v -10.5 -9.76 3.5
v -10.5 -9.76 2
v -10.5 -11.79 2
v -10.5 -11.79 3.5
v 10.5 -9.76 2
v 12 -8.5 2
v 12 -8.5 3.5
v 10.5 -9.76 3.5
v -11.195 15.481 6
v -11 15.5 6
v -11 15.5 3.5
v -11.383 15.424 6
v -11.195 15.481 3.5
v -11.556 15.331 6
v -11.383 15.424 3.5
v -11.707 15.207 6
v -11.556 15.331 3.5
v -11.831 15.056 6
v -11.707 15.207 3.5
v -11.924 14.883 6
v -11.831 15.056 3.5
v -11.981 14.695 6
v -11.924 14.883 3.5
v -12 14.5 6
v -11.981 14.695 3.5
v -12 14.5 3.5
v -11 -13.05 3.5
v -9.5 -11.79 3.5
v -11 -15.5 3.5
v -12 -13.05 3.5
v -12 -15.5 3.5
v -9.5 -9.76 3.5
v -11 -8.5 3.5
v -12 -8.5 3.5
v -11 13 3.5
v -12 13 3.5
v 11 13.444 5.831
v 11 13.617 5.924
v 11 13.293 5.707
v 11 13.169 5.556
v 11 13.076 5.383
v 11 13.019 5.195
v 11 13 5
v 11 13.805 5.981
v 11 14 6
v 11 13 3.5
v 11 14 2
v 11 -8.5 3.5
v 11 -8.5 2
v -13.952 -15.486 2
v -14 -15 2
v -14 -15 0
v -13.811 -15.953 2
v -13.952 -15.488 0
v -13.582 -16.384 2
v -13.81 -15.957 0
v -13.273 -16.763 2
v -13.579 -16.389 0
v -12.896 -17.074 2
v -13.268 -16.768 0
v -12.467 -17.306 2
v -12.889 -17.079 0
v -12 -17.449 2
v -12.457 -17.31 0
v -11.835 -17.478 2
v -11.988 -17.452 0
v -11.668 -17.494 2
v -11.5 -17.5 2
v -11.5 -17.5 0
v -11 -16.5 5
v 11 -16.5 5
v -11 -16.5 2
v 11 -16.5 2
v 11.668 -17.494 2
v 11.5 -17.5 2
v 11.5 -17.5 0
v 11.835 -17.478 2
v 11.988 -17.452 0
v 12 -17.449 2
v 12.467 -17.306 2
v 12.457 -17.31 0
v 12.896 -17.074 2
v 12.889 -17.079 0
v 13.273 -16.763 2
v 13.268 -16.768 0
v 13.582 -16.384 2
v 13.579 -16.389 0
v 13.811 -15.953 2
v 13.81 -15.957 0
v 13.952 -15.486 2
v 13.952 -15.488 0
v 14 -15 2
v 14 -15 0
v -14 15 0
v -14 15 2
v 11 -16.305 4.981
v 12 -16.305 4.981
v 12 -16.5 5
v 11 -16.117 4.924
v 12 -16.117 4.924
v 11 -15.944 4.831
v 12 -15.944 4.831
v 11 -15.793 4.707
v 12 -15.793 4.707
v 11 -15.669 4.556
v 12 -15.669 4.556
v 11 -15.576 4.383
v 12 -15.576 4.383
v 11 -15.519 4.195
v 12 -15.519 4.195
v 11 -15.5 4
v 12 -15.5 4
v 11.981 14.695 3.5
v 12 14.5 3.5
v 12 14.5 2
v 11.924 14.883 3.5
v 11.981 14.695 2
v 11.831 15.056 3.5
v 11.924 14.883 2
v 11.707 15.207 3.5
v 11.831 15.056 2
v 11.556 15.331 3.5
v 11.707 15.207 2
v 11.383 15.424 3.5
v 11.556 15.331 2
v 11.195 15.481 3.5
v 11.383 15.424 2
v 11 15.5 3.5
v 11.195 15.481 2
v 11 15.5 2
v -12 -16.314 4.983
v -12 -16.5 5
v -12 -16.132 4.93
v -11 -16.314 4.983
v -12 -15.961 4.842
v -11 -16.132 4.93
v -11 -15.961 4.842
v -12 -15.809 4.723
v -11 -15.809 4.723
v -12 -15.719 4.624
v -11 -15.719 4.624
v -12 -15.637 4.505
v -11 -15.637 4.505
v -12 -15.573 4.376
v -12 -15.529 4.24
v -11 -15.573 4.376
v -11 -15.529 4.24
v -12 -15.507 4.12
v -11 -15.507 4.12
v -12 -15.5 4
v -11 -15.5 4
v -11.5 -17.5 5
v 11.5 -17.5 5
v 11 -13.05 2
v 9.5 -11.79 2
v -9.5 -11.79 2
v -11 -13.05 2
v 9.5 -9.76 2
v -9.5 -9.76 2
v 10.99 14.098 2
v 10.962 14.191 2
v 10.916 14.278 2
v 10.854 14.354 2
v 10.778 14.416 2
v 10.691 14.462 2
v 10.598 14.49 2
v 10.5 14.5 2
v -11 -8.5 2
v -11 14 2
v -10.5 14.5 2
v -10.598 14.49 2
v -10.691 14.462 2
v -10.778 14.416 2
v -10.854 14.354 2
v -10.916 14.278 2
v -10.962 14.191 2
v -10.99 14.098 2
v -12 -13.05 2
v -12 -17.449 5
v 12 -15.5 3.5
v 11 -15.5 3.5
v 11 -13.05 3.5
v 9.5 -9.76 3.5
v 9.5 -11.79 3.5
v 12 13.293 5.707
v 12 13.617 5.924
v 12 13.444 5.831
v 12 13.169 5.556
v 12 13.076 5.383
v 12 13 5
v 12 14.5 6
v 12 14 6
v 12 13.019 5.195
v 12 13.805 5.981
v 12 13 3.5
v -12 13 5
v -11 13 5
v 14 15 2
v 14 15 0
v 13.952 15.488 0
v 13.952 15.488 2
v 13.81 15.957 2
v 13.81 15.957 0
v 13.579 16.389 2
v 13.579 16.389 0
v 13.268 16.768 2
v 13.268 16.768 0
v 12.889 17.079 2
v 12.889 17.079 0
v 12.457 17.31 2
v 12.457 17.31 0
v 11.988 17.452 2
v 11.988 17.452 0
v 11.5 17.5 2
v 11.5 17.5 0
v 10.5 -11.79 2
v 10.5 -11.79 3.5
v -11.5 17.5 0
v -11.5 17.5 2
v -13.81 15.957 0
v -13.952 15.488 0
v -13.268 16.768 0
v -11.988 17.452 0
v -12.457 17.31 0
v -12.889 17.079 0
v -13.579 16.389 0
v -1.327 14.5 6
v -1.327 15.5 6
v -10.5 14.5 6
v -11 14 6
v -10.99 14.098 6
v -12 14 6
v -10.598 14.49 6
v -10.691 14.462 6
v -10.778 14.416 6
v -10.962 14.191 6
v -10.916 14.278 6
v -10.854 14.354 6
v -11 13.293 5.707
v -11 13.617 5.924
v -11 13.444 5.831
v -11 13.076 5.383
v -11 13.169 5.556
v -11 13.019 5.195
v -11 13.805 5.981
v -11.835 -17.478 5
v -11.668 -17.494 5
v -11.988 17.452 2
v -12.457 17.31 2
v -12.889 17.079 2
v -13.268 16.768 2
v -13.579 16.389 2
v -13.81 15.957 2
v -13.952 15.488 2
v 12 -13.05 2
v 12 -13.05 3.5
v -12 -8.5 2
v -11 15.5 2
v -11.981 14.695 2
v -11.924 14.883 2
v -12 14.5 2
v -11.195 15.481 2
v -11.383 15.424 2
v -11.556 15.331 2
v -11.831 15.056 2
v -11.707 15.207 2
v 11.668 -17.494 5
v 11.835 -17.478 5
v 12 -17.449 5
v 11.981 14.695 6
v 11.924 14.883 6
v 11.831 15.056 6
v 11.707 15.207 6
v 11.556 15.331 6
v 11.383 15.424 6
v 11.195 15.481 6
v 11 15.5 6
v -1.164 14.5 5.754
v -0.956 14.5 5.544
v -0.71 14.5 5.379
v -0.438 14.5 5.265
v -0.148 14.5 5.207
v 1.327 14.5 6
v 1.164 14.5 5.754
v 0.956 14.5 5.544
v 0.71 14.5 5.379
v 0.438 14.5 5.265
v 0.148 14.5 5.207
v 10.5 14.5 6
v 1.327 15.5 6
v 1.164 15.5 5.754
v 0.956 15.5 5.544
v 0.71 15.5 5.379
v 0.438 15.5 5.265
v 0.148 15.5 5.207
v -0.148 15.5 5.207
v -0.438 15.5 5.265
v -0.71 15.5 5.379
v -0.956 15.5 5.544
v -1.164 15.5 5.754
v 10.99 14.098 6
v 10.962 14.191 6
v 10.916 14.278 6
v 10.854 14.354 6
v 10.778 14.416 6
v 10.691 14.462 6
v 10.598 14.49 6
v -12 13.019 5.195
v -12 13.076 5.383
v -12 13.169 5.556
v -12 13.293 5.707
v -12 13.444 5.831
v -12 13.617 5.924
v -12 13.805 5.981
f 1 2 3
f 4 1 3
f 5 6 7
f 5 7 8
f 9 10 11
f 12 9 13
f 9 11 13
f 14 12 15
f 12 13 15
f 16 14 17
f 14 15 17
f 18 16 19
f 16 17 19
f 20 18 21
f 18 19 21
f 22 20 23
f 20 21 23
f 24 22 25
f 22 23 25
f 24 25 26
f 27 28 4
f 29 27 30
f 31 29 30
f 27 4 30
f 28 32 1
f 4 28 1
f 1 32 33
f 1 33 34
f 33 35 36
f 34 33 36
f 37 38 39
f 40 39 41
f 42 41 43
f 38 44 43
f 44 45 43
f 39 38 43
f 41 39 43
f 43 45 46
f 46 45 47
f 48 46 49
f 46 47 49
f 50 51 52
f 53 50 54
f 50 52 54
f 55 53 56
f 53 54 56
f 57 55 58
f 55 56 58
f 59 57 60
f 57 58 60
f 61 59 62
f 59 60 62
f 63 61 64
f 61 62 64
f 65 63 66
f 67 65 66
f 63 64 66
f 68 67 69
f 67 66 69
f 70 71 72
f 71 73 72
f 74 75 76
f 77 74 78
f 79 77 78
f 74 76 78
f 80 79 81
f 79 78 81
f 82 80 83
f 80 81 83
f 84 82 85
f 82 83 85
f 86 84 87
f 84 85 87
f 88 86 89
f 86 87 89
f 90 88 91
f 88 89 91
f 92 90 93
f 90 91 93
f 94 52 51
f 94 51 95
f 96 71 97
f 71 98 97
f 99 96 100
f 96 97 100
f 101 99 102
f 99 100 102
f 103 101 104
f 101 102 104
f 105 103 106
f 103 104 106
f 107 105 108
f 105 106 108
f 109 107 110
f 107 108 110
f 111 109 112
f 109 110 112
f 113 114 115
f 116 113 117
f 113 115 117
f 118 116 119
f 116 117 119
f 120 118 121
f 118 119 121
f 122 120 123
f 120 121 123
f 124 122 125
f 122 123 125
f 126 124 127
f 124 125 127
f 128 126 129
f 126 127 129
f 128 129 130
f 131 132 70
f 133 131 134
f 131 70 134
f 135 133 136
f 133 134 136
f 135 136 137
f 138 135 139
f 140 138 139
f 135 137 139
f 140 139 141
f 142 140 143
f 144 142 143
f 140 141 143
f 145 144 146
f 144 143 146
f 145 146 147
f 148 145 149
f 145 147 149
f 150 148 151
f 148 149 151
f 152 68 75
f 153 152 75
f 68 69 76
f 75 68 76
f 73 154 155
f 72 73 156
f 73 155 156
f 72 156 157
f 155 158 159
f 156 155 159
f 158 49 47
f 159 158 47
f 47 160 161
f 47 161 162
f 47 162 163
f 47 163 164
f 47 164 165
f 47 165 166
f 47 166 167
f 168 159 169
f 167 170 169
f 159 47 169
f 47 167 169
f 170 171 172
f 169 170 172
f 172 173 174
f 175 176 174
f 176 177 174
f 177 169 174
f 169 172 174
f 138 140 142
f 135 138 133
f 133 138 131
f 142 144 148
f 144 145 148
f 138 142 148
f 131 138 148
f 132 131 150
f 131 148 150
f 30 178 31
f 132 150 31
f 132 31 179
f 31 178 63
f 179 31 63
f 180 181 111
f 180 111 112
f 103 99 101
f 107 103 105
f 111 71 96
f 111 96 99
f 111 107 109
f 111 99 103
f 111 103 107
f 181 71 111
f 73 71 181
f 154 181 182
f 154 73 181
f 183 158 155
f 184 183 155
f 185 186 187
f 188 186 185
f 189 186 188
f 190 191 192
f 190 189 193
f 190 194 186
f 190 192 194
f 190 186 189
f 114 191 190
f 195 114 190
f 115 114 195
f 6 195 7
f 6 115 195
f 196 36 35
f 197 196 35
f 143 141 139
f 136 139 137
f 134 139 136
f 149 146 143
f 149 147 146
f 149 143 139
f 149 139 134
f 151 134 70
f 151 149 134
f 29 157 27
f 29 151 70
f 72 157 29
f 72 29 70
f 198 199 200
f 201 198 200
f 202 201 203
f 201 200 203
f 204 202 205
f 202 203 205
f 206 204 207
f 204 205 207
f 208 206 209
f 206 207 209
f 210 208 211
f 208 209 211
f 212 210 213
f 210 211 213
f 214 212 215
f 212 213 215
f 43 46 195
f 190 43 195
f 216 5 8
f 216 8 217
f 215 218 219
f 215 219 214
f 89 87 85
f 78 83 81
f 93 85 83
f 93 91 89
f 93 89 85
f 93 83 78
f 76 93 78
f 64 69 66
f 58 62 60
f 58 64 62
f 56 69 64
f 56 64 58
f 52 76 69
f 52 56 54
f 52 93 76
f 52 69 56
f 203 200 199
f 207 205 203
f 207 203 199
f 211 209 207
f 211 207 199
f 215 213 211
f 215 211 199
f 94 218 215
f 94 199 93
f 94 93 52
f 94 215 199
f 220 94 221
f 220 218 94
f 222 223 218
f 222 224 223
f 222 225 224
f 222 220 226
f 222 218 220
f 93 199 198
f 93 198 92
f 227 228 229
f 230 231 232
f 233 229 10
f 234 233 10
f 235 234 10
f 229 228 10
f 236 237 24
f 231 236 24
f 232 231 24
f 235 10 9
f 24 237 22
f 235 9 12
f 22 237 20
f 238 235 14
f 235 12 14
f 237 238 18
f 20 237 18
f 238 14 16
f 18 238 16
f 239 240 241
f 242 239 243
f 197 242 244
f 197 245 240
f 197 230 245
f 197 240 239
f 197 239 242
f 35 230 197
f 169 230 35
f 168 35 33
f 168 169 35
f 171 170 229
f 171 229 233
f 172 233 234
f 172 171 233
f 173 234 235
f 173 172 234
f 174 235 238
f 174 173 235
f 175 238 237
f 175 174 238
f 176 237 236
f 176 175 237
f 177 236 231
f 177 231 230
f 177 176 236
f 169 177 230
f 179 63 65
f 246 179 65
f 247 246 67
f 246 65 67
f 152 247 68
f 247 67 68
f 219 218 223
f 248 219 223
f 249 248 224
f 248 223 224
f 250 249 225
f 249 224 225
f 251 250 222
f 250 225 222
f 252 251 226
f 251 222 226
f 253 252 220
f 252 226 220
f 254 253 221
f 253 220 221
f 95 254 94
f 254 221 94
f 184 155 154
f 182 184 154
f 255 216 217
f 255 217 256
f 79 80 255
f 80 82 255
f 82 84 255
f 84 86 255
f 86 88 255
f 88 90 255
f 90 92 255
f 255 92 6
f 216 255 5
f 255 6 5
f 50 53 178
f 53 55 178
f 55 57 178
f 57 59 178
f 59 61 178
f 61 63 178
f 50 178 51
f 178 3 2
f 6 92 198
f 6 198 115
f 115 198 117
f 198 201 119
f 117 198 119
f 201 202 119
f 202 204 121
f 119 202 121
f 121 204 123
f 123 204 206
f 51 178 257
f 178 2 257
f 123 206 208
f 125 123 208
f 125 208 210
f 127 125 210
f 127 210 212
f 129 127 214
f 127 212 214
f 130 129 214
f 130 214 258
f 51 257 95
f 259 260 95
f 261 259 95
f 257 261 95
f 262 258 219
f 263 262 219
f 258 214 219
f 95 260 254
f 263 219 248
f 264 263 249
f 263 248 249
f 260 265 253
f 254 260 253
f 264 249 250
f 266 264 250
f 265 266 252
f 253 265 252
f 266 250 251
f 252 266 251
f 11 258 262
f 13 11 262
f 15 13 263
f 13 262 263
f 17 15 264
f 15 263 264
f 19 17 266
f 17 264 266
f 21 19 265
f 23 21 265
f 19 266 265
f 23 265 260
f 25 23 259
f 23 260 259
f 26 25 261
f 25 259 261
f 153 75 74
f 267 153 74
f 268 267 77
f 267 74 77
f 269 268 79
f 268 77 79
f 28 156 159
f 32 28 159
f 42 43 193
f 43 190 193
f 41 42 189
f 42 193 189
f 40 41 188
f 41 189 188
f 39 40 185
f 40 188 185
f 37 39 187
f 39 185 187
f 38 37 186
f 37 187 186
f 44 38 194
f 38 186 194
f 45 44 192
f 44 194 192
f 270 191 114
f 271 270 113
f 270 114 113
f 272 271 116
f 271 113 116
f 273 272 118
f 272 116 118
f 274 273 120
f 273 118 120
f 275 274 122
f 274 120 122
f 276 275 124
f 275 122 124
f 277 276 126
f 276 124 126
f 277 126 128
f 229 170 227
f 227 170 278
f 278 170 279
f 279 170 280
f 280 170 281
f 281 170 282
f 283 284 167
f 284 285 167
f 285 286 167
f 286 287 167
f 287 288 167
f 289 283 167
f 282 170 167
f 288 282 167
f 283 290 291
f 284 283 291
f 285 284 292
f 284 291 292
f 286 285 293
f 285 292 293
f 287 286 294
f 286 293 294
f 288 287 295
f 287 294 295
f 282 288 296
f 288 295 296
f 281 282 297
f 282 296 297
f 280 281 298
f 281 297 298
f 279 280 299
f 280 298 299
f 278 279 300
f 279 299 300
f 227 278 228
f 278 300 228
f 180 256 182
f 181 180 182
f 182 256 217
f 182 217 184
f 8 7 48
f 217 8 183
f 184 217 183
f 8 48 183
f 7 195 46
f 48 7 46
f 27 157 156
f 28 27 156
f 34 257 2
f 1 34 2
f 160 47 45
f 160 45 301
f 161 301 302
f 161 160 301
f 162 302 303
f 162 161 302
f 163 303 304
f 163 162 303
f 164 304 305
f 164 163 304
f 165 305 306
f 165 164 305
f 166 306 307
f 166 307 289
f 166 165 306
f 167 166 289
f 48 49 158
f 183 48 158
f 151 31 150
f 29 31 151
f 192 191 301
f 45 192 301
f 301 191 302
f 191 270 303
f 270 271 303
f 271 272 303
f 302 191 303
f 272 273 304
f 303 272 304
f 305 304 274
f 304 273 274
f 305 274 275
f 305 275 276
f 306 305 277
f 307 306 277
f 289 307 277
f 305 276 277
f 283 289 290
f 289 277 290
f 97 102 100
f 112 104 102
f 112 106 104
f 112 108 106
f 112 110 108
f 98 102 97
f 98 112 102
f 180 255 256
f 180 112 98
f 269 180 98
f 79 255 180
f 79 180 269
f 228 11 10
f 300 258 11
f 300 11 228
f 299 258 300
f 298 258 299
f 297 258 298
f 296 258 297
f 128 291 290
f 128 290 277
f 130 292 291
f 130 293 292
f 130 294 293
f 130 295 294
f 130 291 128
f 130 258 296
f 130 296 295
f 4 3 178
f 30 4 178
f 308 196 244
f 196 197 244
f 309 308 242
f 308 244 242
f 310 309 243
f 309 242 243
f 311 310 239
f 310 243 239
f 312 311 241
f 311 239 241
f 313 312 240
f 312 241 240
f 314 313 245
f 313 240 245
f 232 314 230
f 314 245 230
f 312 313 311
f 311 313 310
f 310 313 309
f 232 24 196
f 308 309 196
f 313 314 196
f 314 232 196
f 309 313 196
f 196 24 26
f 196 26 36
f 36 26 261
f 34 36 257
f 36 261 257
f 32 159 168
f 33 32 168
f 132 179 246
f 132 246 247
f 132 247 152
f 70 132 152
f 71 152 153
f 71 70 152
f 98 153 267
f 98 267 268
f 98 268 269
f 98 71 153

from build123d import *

# Parameters (mm, degrees)
PAD_DEPTH    = 2
PAD001_DEPTH = 1.5
PAD002_DEPTH = 1.5
PAD003_DEPTH = 2.5
SKETCH004_R  = 1.5
POCKET_DEPTH = 5
FILLET_R     = 1
FILLET001_R  = 1
FILLET002_R  = 1


with BuildPart() as part:
    # Sketch → Pad (new body)
    with BuildSketch(Plane.XY):
        with BuildLine():
            Line((-11.5, 17.5), (11.5, 17.5))
            ThreePointArc((14, 15), (13.267767, 16.767767), (11.5, 17.5))
            Line((14, 15), (14, -15))
            ThreePointArc((11.5, -17.5), (13.267767, -16.767767), (14, -15))
            Line((11.5, -17.5), (-11.5, -17.5))
            ThreePointArc((-14, -15), (-13.267767, -16.767767), (-11.5, -17.5))
            Line((-14, -15), (-14, 15))
            ThreePointArc((-11.5, 17.5), (-13.267767, 16.767767), (-14, 15))
        make_face()
    extrude(amount=PAD_DEPTH)

    # Sketch001 (on Face10 of Pad) → Pad001 (join)
    with BuildSketch(Plane.XY.offset(2)):
        with BuildLine():
            Line((-11, 15.5), (11, 15.5))
            ThreePointArc((12, 14.5), (11.707107, 15.207107), (11, 15.5))
            Line((12, 14.5), (12, -8.5))
            Line((12, -8.5), (10.5, -9.76))
            Line((10.5, -9.76), (10.5, -11.79))
            Line((10.5, -11.79), (12, -13.05))
            Line((12, -13.05), (12, -17.44949))
            ThreePointArc((11.5, -17.5), (11.751272, -17.48734), (12, -17.44949))
            Line((-11.5, -17.5), (11.5, -17.5))
            ThreePointArc((-12, -17.44949), (-11.751272, -17.48734), (-11.5, -17.5))
            Line((-12, -13.05), (-12, -17.44949))
            Line((-10.5, -11.79), (-12, -13.05))
            Line((-10.5, -9.76), (-10.5, -11.79))
            Line((-12, -8.5), (-10.5, -9.76))
            Line((-12, 14.5), (-12, -8.5))
            ThreePointArc((-11, 15.5), (-11.707107, 15.207107), (-12, 14.5))
        make_face()
        with BuildLine():
            Line((-11, -16.5), (-11, -13.05))
            Line((-11, -13.05), (-9.5, -11.79))
            Line((-9.5, -11.79), (-9.5, -9.76))
            Line((-9.5, -9.76), (-11, -8.5))
            Line((-11, -8.5), (-11, 14))
            ThreePointArc((-10.5, 14.5), (-10.853553, 14.353553), (-11, 14))
            Line((-10.5, 14.5), (10.5, 14.5))
            ThreePointArc((11, 14), (10.853553, 14.353553), (10.5, 14.5))
            Line((11, 14), (11, -8.5))
            Line((11, -8.5), (9.5, -9.76))
            Line((9.5, -9.76), (9.5, -11.79))
            Line((9.5, -11.79), (11, -13.05))
            Line((11, -13.05), (11, -16.5))
            Line((11, -16.5), (-11, -16.5))
        make_face(mode=Mode.SUBTRACT)
    extrude(amount=PAD001_DEPTH)

    # Sketch002 (on Face26 of Pad001) → Pad002 (join)
    with BuildSketch(Plane.XY.offset(3.5)):
        with BuildLine():
            ThreePointArc((11.5, -17.5), (11.751272, -17.48734), (12, -17.44949))
            Line((12, -16.5), (12, -17.44949))
            Line((12, -15.5), (12, -16.5))
            Line((11, -15.5), (12, -15.5))
            Line((11, -16.5), (11, -15.5))
            Line((11, -16.5), (-11, -16.5))
            Line((-11, -15.5), (-11, -16.5))
            Line((-12, -15.5), (-11, -15.5))
            Line((-12, -16.5), (-12, -15.5))
            Line((-12, -16.5), (-12, -17.44949))
            ThreePointArc((-12, -17.44949), (-11.751272, -17.48734), (-11.5, -17.5))
            Line((-11.5, -17.5), (11.5, -17.5))
        make_face()
    extrude(amount=PAD002_DEPTH)

    # Sketch003 (on Face28 of Pad002) → Pad003 (join)
    with BuildSketch(Plane.XY.offset(3.5)):
        with BuildLine():
            Line((-10.999986, 15.5), (11.000009, 15.5))
            ThreePointArc((12, 14.5), (11.70711, 15.207104), (11.000009, 15.5))
            Line((12, 14.5), (12, 13))
            Line((11, 13), (12, 13))
            Line((11, 14), (11, 13))
            ThreePointArc((11, 14), (10.853553, 14.353553), (10.5, 14.5))
            Line((-10.5, 14.5), (10.5, 14.5))
            ThreePointArc((-10.5, 14.5), (-10.853553, 14.353553), (-11, 14))
            Line((-11, 14), (-11, 13))
            Line((-12, 13), (-11, 13))
            Line((-12, 14.5), (-12, 13))
            ThreePointArc((-10.999986, 15.5), (-11.707102, 15.207112), (-12, 14.5))
        make_face()
    extrude(amount=PAD003_DEPTH)

    # Sketch004 (on Face33 of Pad003) → Pocket (cut)
    with BuildSketch(Plane(origin=(0, 15.5, 0), x_dir=(-1, 0, 0), z_dir=(0, 1, 0))):
        with Locations((0, 6.7)):
            Circle(SKETCH004_R)
    extrude(amount=-POCKET_DEPTH, mode=Mode.SUBTRACT)

    # Fillet
    fillet_edges = [part.edges().sort_by_distance(p)[0] for p in [
        (11.5, -15.5, 5),
    ]]
    fillet(fillet_edges, radius=FILLET_R)

    # Fillet001
    fillet001_edges = [part.edges().sort_by_distance(p)[0] for p in [
        (-11.5, -15.5, 5),
    ]]
    fillet(fillet001_edges, radius=FILLET001_R)

    # Fillet002
    fillet002_edges = [part.edges().sort_by_distance(p)[0] for p in [
        (-11.5, 13, 6),
        (11.5, 13, 6),
    ]]
    fillet(fillet002_edges, radius=FILLET002_R)


solid = part.part
